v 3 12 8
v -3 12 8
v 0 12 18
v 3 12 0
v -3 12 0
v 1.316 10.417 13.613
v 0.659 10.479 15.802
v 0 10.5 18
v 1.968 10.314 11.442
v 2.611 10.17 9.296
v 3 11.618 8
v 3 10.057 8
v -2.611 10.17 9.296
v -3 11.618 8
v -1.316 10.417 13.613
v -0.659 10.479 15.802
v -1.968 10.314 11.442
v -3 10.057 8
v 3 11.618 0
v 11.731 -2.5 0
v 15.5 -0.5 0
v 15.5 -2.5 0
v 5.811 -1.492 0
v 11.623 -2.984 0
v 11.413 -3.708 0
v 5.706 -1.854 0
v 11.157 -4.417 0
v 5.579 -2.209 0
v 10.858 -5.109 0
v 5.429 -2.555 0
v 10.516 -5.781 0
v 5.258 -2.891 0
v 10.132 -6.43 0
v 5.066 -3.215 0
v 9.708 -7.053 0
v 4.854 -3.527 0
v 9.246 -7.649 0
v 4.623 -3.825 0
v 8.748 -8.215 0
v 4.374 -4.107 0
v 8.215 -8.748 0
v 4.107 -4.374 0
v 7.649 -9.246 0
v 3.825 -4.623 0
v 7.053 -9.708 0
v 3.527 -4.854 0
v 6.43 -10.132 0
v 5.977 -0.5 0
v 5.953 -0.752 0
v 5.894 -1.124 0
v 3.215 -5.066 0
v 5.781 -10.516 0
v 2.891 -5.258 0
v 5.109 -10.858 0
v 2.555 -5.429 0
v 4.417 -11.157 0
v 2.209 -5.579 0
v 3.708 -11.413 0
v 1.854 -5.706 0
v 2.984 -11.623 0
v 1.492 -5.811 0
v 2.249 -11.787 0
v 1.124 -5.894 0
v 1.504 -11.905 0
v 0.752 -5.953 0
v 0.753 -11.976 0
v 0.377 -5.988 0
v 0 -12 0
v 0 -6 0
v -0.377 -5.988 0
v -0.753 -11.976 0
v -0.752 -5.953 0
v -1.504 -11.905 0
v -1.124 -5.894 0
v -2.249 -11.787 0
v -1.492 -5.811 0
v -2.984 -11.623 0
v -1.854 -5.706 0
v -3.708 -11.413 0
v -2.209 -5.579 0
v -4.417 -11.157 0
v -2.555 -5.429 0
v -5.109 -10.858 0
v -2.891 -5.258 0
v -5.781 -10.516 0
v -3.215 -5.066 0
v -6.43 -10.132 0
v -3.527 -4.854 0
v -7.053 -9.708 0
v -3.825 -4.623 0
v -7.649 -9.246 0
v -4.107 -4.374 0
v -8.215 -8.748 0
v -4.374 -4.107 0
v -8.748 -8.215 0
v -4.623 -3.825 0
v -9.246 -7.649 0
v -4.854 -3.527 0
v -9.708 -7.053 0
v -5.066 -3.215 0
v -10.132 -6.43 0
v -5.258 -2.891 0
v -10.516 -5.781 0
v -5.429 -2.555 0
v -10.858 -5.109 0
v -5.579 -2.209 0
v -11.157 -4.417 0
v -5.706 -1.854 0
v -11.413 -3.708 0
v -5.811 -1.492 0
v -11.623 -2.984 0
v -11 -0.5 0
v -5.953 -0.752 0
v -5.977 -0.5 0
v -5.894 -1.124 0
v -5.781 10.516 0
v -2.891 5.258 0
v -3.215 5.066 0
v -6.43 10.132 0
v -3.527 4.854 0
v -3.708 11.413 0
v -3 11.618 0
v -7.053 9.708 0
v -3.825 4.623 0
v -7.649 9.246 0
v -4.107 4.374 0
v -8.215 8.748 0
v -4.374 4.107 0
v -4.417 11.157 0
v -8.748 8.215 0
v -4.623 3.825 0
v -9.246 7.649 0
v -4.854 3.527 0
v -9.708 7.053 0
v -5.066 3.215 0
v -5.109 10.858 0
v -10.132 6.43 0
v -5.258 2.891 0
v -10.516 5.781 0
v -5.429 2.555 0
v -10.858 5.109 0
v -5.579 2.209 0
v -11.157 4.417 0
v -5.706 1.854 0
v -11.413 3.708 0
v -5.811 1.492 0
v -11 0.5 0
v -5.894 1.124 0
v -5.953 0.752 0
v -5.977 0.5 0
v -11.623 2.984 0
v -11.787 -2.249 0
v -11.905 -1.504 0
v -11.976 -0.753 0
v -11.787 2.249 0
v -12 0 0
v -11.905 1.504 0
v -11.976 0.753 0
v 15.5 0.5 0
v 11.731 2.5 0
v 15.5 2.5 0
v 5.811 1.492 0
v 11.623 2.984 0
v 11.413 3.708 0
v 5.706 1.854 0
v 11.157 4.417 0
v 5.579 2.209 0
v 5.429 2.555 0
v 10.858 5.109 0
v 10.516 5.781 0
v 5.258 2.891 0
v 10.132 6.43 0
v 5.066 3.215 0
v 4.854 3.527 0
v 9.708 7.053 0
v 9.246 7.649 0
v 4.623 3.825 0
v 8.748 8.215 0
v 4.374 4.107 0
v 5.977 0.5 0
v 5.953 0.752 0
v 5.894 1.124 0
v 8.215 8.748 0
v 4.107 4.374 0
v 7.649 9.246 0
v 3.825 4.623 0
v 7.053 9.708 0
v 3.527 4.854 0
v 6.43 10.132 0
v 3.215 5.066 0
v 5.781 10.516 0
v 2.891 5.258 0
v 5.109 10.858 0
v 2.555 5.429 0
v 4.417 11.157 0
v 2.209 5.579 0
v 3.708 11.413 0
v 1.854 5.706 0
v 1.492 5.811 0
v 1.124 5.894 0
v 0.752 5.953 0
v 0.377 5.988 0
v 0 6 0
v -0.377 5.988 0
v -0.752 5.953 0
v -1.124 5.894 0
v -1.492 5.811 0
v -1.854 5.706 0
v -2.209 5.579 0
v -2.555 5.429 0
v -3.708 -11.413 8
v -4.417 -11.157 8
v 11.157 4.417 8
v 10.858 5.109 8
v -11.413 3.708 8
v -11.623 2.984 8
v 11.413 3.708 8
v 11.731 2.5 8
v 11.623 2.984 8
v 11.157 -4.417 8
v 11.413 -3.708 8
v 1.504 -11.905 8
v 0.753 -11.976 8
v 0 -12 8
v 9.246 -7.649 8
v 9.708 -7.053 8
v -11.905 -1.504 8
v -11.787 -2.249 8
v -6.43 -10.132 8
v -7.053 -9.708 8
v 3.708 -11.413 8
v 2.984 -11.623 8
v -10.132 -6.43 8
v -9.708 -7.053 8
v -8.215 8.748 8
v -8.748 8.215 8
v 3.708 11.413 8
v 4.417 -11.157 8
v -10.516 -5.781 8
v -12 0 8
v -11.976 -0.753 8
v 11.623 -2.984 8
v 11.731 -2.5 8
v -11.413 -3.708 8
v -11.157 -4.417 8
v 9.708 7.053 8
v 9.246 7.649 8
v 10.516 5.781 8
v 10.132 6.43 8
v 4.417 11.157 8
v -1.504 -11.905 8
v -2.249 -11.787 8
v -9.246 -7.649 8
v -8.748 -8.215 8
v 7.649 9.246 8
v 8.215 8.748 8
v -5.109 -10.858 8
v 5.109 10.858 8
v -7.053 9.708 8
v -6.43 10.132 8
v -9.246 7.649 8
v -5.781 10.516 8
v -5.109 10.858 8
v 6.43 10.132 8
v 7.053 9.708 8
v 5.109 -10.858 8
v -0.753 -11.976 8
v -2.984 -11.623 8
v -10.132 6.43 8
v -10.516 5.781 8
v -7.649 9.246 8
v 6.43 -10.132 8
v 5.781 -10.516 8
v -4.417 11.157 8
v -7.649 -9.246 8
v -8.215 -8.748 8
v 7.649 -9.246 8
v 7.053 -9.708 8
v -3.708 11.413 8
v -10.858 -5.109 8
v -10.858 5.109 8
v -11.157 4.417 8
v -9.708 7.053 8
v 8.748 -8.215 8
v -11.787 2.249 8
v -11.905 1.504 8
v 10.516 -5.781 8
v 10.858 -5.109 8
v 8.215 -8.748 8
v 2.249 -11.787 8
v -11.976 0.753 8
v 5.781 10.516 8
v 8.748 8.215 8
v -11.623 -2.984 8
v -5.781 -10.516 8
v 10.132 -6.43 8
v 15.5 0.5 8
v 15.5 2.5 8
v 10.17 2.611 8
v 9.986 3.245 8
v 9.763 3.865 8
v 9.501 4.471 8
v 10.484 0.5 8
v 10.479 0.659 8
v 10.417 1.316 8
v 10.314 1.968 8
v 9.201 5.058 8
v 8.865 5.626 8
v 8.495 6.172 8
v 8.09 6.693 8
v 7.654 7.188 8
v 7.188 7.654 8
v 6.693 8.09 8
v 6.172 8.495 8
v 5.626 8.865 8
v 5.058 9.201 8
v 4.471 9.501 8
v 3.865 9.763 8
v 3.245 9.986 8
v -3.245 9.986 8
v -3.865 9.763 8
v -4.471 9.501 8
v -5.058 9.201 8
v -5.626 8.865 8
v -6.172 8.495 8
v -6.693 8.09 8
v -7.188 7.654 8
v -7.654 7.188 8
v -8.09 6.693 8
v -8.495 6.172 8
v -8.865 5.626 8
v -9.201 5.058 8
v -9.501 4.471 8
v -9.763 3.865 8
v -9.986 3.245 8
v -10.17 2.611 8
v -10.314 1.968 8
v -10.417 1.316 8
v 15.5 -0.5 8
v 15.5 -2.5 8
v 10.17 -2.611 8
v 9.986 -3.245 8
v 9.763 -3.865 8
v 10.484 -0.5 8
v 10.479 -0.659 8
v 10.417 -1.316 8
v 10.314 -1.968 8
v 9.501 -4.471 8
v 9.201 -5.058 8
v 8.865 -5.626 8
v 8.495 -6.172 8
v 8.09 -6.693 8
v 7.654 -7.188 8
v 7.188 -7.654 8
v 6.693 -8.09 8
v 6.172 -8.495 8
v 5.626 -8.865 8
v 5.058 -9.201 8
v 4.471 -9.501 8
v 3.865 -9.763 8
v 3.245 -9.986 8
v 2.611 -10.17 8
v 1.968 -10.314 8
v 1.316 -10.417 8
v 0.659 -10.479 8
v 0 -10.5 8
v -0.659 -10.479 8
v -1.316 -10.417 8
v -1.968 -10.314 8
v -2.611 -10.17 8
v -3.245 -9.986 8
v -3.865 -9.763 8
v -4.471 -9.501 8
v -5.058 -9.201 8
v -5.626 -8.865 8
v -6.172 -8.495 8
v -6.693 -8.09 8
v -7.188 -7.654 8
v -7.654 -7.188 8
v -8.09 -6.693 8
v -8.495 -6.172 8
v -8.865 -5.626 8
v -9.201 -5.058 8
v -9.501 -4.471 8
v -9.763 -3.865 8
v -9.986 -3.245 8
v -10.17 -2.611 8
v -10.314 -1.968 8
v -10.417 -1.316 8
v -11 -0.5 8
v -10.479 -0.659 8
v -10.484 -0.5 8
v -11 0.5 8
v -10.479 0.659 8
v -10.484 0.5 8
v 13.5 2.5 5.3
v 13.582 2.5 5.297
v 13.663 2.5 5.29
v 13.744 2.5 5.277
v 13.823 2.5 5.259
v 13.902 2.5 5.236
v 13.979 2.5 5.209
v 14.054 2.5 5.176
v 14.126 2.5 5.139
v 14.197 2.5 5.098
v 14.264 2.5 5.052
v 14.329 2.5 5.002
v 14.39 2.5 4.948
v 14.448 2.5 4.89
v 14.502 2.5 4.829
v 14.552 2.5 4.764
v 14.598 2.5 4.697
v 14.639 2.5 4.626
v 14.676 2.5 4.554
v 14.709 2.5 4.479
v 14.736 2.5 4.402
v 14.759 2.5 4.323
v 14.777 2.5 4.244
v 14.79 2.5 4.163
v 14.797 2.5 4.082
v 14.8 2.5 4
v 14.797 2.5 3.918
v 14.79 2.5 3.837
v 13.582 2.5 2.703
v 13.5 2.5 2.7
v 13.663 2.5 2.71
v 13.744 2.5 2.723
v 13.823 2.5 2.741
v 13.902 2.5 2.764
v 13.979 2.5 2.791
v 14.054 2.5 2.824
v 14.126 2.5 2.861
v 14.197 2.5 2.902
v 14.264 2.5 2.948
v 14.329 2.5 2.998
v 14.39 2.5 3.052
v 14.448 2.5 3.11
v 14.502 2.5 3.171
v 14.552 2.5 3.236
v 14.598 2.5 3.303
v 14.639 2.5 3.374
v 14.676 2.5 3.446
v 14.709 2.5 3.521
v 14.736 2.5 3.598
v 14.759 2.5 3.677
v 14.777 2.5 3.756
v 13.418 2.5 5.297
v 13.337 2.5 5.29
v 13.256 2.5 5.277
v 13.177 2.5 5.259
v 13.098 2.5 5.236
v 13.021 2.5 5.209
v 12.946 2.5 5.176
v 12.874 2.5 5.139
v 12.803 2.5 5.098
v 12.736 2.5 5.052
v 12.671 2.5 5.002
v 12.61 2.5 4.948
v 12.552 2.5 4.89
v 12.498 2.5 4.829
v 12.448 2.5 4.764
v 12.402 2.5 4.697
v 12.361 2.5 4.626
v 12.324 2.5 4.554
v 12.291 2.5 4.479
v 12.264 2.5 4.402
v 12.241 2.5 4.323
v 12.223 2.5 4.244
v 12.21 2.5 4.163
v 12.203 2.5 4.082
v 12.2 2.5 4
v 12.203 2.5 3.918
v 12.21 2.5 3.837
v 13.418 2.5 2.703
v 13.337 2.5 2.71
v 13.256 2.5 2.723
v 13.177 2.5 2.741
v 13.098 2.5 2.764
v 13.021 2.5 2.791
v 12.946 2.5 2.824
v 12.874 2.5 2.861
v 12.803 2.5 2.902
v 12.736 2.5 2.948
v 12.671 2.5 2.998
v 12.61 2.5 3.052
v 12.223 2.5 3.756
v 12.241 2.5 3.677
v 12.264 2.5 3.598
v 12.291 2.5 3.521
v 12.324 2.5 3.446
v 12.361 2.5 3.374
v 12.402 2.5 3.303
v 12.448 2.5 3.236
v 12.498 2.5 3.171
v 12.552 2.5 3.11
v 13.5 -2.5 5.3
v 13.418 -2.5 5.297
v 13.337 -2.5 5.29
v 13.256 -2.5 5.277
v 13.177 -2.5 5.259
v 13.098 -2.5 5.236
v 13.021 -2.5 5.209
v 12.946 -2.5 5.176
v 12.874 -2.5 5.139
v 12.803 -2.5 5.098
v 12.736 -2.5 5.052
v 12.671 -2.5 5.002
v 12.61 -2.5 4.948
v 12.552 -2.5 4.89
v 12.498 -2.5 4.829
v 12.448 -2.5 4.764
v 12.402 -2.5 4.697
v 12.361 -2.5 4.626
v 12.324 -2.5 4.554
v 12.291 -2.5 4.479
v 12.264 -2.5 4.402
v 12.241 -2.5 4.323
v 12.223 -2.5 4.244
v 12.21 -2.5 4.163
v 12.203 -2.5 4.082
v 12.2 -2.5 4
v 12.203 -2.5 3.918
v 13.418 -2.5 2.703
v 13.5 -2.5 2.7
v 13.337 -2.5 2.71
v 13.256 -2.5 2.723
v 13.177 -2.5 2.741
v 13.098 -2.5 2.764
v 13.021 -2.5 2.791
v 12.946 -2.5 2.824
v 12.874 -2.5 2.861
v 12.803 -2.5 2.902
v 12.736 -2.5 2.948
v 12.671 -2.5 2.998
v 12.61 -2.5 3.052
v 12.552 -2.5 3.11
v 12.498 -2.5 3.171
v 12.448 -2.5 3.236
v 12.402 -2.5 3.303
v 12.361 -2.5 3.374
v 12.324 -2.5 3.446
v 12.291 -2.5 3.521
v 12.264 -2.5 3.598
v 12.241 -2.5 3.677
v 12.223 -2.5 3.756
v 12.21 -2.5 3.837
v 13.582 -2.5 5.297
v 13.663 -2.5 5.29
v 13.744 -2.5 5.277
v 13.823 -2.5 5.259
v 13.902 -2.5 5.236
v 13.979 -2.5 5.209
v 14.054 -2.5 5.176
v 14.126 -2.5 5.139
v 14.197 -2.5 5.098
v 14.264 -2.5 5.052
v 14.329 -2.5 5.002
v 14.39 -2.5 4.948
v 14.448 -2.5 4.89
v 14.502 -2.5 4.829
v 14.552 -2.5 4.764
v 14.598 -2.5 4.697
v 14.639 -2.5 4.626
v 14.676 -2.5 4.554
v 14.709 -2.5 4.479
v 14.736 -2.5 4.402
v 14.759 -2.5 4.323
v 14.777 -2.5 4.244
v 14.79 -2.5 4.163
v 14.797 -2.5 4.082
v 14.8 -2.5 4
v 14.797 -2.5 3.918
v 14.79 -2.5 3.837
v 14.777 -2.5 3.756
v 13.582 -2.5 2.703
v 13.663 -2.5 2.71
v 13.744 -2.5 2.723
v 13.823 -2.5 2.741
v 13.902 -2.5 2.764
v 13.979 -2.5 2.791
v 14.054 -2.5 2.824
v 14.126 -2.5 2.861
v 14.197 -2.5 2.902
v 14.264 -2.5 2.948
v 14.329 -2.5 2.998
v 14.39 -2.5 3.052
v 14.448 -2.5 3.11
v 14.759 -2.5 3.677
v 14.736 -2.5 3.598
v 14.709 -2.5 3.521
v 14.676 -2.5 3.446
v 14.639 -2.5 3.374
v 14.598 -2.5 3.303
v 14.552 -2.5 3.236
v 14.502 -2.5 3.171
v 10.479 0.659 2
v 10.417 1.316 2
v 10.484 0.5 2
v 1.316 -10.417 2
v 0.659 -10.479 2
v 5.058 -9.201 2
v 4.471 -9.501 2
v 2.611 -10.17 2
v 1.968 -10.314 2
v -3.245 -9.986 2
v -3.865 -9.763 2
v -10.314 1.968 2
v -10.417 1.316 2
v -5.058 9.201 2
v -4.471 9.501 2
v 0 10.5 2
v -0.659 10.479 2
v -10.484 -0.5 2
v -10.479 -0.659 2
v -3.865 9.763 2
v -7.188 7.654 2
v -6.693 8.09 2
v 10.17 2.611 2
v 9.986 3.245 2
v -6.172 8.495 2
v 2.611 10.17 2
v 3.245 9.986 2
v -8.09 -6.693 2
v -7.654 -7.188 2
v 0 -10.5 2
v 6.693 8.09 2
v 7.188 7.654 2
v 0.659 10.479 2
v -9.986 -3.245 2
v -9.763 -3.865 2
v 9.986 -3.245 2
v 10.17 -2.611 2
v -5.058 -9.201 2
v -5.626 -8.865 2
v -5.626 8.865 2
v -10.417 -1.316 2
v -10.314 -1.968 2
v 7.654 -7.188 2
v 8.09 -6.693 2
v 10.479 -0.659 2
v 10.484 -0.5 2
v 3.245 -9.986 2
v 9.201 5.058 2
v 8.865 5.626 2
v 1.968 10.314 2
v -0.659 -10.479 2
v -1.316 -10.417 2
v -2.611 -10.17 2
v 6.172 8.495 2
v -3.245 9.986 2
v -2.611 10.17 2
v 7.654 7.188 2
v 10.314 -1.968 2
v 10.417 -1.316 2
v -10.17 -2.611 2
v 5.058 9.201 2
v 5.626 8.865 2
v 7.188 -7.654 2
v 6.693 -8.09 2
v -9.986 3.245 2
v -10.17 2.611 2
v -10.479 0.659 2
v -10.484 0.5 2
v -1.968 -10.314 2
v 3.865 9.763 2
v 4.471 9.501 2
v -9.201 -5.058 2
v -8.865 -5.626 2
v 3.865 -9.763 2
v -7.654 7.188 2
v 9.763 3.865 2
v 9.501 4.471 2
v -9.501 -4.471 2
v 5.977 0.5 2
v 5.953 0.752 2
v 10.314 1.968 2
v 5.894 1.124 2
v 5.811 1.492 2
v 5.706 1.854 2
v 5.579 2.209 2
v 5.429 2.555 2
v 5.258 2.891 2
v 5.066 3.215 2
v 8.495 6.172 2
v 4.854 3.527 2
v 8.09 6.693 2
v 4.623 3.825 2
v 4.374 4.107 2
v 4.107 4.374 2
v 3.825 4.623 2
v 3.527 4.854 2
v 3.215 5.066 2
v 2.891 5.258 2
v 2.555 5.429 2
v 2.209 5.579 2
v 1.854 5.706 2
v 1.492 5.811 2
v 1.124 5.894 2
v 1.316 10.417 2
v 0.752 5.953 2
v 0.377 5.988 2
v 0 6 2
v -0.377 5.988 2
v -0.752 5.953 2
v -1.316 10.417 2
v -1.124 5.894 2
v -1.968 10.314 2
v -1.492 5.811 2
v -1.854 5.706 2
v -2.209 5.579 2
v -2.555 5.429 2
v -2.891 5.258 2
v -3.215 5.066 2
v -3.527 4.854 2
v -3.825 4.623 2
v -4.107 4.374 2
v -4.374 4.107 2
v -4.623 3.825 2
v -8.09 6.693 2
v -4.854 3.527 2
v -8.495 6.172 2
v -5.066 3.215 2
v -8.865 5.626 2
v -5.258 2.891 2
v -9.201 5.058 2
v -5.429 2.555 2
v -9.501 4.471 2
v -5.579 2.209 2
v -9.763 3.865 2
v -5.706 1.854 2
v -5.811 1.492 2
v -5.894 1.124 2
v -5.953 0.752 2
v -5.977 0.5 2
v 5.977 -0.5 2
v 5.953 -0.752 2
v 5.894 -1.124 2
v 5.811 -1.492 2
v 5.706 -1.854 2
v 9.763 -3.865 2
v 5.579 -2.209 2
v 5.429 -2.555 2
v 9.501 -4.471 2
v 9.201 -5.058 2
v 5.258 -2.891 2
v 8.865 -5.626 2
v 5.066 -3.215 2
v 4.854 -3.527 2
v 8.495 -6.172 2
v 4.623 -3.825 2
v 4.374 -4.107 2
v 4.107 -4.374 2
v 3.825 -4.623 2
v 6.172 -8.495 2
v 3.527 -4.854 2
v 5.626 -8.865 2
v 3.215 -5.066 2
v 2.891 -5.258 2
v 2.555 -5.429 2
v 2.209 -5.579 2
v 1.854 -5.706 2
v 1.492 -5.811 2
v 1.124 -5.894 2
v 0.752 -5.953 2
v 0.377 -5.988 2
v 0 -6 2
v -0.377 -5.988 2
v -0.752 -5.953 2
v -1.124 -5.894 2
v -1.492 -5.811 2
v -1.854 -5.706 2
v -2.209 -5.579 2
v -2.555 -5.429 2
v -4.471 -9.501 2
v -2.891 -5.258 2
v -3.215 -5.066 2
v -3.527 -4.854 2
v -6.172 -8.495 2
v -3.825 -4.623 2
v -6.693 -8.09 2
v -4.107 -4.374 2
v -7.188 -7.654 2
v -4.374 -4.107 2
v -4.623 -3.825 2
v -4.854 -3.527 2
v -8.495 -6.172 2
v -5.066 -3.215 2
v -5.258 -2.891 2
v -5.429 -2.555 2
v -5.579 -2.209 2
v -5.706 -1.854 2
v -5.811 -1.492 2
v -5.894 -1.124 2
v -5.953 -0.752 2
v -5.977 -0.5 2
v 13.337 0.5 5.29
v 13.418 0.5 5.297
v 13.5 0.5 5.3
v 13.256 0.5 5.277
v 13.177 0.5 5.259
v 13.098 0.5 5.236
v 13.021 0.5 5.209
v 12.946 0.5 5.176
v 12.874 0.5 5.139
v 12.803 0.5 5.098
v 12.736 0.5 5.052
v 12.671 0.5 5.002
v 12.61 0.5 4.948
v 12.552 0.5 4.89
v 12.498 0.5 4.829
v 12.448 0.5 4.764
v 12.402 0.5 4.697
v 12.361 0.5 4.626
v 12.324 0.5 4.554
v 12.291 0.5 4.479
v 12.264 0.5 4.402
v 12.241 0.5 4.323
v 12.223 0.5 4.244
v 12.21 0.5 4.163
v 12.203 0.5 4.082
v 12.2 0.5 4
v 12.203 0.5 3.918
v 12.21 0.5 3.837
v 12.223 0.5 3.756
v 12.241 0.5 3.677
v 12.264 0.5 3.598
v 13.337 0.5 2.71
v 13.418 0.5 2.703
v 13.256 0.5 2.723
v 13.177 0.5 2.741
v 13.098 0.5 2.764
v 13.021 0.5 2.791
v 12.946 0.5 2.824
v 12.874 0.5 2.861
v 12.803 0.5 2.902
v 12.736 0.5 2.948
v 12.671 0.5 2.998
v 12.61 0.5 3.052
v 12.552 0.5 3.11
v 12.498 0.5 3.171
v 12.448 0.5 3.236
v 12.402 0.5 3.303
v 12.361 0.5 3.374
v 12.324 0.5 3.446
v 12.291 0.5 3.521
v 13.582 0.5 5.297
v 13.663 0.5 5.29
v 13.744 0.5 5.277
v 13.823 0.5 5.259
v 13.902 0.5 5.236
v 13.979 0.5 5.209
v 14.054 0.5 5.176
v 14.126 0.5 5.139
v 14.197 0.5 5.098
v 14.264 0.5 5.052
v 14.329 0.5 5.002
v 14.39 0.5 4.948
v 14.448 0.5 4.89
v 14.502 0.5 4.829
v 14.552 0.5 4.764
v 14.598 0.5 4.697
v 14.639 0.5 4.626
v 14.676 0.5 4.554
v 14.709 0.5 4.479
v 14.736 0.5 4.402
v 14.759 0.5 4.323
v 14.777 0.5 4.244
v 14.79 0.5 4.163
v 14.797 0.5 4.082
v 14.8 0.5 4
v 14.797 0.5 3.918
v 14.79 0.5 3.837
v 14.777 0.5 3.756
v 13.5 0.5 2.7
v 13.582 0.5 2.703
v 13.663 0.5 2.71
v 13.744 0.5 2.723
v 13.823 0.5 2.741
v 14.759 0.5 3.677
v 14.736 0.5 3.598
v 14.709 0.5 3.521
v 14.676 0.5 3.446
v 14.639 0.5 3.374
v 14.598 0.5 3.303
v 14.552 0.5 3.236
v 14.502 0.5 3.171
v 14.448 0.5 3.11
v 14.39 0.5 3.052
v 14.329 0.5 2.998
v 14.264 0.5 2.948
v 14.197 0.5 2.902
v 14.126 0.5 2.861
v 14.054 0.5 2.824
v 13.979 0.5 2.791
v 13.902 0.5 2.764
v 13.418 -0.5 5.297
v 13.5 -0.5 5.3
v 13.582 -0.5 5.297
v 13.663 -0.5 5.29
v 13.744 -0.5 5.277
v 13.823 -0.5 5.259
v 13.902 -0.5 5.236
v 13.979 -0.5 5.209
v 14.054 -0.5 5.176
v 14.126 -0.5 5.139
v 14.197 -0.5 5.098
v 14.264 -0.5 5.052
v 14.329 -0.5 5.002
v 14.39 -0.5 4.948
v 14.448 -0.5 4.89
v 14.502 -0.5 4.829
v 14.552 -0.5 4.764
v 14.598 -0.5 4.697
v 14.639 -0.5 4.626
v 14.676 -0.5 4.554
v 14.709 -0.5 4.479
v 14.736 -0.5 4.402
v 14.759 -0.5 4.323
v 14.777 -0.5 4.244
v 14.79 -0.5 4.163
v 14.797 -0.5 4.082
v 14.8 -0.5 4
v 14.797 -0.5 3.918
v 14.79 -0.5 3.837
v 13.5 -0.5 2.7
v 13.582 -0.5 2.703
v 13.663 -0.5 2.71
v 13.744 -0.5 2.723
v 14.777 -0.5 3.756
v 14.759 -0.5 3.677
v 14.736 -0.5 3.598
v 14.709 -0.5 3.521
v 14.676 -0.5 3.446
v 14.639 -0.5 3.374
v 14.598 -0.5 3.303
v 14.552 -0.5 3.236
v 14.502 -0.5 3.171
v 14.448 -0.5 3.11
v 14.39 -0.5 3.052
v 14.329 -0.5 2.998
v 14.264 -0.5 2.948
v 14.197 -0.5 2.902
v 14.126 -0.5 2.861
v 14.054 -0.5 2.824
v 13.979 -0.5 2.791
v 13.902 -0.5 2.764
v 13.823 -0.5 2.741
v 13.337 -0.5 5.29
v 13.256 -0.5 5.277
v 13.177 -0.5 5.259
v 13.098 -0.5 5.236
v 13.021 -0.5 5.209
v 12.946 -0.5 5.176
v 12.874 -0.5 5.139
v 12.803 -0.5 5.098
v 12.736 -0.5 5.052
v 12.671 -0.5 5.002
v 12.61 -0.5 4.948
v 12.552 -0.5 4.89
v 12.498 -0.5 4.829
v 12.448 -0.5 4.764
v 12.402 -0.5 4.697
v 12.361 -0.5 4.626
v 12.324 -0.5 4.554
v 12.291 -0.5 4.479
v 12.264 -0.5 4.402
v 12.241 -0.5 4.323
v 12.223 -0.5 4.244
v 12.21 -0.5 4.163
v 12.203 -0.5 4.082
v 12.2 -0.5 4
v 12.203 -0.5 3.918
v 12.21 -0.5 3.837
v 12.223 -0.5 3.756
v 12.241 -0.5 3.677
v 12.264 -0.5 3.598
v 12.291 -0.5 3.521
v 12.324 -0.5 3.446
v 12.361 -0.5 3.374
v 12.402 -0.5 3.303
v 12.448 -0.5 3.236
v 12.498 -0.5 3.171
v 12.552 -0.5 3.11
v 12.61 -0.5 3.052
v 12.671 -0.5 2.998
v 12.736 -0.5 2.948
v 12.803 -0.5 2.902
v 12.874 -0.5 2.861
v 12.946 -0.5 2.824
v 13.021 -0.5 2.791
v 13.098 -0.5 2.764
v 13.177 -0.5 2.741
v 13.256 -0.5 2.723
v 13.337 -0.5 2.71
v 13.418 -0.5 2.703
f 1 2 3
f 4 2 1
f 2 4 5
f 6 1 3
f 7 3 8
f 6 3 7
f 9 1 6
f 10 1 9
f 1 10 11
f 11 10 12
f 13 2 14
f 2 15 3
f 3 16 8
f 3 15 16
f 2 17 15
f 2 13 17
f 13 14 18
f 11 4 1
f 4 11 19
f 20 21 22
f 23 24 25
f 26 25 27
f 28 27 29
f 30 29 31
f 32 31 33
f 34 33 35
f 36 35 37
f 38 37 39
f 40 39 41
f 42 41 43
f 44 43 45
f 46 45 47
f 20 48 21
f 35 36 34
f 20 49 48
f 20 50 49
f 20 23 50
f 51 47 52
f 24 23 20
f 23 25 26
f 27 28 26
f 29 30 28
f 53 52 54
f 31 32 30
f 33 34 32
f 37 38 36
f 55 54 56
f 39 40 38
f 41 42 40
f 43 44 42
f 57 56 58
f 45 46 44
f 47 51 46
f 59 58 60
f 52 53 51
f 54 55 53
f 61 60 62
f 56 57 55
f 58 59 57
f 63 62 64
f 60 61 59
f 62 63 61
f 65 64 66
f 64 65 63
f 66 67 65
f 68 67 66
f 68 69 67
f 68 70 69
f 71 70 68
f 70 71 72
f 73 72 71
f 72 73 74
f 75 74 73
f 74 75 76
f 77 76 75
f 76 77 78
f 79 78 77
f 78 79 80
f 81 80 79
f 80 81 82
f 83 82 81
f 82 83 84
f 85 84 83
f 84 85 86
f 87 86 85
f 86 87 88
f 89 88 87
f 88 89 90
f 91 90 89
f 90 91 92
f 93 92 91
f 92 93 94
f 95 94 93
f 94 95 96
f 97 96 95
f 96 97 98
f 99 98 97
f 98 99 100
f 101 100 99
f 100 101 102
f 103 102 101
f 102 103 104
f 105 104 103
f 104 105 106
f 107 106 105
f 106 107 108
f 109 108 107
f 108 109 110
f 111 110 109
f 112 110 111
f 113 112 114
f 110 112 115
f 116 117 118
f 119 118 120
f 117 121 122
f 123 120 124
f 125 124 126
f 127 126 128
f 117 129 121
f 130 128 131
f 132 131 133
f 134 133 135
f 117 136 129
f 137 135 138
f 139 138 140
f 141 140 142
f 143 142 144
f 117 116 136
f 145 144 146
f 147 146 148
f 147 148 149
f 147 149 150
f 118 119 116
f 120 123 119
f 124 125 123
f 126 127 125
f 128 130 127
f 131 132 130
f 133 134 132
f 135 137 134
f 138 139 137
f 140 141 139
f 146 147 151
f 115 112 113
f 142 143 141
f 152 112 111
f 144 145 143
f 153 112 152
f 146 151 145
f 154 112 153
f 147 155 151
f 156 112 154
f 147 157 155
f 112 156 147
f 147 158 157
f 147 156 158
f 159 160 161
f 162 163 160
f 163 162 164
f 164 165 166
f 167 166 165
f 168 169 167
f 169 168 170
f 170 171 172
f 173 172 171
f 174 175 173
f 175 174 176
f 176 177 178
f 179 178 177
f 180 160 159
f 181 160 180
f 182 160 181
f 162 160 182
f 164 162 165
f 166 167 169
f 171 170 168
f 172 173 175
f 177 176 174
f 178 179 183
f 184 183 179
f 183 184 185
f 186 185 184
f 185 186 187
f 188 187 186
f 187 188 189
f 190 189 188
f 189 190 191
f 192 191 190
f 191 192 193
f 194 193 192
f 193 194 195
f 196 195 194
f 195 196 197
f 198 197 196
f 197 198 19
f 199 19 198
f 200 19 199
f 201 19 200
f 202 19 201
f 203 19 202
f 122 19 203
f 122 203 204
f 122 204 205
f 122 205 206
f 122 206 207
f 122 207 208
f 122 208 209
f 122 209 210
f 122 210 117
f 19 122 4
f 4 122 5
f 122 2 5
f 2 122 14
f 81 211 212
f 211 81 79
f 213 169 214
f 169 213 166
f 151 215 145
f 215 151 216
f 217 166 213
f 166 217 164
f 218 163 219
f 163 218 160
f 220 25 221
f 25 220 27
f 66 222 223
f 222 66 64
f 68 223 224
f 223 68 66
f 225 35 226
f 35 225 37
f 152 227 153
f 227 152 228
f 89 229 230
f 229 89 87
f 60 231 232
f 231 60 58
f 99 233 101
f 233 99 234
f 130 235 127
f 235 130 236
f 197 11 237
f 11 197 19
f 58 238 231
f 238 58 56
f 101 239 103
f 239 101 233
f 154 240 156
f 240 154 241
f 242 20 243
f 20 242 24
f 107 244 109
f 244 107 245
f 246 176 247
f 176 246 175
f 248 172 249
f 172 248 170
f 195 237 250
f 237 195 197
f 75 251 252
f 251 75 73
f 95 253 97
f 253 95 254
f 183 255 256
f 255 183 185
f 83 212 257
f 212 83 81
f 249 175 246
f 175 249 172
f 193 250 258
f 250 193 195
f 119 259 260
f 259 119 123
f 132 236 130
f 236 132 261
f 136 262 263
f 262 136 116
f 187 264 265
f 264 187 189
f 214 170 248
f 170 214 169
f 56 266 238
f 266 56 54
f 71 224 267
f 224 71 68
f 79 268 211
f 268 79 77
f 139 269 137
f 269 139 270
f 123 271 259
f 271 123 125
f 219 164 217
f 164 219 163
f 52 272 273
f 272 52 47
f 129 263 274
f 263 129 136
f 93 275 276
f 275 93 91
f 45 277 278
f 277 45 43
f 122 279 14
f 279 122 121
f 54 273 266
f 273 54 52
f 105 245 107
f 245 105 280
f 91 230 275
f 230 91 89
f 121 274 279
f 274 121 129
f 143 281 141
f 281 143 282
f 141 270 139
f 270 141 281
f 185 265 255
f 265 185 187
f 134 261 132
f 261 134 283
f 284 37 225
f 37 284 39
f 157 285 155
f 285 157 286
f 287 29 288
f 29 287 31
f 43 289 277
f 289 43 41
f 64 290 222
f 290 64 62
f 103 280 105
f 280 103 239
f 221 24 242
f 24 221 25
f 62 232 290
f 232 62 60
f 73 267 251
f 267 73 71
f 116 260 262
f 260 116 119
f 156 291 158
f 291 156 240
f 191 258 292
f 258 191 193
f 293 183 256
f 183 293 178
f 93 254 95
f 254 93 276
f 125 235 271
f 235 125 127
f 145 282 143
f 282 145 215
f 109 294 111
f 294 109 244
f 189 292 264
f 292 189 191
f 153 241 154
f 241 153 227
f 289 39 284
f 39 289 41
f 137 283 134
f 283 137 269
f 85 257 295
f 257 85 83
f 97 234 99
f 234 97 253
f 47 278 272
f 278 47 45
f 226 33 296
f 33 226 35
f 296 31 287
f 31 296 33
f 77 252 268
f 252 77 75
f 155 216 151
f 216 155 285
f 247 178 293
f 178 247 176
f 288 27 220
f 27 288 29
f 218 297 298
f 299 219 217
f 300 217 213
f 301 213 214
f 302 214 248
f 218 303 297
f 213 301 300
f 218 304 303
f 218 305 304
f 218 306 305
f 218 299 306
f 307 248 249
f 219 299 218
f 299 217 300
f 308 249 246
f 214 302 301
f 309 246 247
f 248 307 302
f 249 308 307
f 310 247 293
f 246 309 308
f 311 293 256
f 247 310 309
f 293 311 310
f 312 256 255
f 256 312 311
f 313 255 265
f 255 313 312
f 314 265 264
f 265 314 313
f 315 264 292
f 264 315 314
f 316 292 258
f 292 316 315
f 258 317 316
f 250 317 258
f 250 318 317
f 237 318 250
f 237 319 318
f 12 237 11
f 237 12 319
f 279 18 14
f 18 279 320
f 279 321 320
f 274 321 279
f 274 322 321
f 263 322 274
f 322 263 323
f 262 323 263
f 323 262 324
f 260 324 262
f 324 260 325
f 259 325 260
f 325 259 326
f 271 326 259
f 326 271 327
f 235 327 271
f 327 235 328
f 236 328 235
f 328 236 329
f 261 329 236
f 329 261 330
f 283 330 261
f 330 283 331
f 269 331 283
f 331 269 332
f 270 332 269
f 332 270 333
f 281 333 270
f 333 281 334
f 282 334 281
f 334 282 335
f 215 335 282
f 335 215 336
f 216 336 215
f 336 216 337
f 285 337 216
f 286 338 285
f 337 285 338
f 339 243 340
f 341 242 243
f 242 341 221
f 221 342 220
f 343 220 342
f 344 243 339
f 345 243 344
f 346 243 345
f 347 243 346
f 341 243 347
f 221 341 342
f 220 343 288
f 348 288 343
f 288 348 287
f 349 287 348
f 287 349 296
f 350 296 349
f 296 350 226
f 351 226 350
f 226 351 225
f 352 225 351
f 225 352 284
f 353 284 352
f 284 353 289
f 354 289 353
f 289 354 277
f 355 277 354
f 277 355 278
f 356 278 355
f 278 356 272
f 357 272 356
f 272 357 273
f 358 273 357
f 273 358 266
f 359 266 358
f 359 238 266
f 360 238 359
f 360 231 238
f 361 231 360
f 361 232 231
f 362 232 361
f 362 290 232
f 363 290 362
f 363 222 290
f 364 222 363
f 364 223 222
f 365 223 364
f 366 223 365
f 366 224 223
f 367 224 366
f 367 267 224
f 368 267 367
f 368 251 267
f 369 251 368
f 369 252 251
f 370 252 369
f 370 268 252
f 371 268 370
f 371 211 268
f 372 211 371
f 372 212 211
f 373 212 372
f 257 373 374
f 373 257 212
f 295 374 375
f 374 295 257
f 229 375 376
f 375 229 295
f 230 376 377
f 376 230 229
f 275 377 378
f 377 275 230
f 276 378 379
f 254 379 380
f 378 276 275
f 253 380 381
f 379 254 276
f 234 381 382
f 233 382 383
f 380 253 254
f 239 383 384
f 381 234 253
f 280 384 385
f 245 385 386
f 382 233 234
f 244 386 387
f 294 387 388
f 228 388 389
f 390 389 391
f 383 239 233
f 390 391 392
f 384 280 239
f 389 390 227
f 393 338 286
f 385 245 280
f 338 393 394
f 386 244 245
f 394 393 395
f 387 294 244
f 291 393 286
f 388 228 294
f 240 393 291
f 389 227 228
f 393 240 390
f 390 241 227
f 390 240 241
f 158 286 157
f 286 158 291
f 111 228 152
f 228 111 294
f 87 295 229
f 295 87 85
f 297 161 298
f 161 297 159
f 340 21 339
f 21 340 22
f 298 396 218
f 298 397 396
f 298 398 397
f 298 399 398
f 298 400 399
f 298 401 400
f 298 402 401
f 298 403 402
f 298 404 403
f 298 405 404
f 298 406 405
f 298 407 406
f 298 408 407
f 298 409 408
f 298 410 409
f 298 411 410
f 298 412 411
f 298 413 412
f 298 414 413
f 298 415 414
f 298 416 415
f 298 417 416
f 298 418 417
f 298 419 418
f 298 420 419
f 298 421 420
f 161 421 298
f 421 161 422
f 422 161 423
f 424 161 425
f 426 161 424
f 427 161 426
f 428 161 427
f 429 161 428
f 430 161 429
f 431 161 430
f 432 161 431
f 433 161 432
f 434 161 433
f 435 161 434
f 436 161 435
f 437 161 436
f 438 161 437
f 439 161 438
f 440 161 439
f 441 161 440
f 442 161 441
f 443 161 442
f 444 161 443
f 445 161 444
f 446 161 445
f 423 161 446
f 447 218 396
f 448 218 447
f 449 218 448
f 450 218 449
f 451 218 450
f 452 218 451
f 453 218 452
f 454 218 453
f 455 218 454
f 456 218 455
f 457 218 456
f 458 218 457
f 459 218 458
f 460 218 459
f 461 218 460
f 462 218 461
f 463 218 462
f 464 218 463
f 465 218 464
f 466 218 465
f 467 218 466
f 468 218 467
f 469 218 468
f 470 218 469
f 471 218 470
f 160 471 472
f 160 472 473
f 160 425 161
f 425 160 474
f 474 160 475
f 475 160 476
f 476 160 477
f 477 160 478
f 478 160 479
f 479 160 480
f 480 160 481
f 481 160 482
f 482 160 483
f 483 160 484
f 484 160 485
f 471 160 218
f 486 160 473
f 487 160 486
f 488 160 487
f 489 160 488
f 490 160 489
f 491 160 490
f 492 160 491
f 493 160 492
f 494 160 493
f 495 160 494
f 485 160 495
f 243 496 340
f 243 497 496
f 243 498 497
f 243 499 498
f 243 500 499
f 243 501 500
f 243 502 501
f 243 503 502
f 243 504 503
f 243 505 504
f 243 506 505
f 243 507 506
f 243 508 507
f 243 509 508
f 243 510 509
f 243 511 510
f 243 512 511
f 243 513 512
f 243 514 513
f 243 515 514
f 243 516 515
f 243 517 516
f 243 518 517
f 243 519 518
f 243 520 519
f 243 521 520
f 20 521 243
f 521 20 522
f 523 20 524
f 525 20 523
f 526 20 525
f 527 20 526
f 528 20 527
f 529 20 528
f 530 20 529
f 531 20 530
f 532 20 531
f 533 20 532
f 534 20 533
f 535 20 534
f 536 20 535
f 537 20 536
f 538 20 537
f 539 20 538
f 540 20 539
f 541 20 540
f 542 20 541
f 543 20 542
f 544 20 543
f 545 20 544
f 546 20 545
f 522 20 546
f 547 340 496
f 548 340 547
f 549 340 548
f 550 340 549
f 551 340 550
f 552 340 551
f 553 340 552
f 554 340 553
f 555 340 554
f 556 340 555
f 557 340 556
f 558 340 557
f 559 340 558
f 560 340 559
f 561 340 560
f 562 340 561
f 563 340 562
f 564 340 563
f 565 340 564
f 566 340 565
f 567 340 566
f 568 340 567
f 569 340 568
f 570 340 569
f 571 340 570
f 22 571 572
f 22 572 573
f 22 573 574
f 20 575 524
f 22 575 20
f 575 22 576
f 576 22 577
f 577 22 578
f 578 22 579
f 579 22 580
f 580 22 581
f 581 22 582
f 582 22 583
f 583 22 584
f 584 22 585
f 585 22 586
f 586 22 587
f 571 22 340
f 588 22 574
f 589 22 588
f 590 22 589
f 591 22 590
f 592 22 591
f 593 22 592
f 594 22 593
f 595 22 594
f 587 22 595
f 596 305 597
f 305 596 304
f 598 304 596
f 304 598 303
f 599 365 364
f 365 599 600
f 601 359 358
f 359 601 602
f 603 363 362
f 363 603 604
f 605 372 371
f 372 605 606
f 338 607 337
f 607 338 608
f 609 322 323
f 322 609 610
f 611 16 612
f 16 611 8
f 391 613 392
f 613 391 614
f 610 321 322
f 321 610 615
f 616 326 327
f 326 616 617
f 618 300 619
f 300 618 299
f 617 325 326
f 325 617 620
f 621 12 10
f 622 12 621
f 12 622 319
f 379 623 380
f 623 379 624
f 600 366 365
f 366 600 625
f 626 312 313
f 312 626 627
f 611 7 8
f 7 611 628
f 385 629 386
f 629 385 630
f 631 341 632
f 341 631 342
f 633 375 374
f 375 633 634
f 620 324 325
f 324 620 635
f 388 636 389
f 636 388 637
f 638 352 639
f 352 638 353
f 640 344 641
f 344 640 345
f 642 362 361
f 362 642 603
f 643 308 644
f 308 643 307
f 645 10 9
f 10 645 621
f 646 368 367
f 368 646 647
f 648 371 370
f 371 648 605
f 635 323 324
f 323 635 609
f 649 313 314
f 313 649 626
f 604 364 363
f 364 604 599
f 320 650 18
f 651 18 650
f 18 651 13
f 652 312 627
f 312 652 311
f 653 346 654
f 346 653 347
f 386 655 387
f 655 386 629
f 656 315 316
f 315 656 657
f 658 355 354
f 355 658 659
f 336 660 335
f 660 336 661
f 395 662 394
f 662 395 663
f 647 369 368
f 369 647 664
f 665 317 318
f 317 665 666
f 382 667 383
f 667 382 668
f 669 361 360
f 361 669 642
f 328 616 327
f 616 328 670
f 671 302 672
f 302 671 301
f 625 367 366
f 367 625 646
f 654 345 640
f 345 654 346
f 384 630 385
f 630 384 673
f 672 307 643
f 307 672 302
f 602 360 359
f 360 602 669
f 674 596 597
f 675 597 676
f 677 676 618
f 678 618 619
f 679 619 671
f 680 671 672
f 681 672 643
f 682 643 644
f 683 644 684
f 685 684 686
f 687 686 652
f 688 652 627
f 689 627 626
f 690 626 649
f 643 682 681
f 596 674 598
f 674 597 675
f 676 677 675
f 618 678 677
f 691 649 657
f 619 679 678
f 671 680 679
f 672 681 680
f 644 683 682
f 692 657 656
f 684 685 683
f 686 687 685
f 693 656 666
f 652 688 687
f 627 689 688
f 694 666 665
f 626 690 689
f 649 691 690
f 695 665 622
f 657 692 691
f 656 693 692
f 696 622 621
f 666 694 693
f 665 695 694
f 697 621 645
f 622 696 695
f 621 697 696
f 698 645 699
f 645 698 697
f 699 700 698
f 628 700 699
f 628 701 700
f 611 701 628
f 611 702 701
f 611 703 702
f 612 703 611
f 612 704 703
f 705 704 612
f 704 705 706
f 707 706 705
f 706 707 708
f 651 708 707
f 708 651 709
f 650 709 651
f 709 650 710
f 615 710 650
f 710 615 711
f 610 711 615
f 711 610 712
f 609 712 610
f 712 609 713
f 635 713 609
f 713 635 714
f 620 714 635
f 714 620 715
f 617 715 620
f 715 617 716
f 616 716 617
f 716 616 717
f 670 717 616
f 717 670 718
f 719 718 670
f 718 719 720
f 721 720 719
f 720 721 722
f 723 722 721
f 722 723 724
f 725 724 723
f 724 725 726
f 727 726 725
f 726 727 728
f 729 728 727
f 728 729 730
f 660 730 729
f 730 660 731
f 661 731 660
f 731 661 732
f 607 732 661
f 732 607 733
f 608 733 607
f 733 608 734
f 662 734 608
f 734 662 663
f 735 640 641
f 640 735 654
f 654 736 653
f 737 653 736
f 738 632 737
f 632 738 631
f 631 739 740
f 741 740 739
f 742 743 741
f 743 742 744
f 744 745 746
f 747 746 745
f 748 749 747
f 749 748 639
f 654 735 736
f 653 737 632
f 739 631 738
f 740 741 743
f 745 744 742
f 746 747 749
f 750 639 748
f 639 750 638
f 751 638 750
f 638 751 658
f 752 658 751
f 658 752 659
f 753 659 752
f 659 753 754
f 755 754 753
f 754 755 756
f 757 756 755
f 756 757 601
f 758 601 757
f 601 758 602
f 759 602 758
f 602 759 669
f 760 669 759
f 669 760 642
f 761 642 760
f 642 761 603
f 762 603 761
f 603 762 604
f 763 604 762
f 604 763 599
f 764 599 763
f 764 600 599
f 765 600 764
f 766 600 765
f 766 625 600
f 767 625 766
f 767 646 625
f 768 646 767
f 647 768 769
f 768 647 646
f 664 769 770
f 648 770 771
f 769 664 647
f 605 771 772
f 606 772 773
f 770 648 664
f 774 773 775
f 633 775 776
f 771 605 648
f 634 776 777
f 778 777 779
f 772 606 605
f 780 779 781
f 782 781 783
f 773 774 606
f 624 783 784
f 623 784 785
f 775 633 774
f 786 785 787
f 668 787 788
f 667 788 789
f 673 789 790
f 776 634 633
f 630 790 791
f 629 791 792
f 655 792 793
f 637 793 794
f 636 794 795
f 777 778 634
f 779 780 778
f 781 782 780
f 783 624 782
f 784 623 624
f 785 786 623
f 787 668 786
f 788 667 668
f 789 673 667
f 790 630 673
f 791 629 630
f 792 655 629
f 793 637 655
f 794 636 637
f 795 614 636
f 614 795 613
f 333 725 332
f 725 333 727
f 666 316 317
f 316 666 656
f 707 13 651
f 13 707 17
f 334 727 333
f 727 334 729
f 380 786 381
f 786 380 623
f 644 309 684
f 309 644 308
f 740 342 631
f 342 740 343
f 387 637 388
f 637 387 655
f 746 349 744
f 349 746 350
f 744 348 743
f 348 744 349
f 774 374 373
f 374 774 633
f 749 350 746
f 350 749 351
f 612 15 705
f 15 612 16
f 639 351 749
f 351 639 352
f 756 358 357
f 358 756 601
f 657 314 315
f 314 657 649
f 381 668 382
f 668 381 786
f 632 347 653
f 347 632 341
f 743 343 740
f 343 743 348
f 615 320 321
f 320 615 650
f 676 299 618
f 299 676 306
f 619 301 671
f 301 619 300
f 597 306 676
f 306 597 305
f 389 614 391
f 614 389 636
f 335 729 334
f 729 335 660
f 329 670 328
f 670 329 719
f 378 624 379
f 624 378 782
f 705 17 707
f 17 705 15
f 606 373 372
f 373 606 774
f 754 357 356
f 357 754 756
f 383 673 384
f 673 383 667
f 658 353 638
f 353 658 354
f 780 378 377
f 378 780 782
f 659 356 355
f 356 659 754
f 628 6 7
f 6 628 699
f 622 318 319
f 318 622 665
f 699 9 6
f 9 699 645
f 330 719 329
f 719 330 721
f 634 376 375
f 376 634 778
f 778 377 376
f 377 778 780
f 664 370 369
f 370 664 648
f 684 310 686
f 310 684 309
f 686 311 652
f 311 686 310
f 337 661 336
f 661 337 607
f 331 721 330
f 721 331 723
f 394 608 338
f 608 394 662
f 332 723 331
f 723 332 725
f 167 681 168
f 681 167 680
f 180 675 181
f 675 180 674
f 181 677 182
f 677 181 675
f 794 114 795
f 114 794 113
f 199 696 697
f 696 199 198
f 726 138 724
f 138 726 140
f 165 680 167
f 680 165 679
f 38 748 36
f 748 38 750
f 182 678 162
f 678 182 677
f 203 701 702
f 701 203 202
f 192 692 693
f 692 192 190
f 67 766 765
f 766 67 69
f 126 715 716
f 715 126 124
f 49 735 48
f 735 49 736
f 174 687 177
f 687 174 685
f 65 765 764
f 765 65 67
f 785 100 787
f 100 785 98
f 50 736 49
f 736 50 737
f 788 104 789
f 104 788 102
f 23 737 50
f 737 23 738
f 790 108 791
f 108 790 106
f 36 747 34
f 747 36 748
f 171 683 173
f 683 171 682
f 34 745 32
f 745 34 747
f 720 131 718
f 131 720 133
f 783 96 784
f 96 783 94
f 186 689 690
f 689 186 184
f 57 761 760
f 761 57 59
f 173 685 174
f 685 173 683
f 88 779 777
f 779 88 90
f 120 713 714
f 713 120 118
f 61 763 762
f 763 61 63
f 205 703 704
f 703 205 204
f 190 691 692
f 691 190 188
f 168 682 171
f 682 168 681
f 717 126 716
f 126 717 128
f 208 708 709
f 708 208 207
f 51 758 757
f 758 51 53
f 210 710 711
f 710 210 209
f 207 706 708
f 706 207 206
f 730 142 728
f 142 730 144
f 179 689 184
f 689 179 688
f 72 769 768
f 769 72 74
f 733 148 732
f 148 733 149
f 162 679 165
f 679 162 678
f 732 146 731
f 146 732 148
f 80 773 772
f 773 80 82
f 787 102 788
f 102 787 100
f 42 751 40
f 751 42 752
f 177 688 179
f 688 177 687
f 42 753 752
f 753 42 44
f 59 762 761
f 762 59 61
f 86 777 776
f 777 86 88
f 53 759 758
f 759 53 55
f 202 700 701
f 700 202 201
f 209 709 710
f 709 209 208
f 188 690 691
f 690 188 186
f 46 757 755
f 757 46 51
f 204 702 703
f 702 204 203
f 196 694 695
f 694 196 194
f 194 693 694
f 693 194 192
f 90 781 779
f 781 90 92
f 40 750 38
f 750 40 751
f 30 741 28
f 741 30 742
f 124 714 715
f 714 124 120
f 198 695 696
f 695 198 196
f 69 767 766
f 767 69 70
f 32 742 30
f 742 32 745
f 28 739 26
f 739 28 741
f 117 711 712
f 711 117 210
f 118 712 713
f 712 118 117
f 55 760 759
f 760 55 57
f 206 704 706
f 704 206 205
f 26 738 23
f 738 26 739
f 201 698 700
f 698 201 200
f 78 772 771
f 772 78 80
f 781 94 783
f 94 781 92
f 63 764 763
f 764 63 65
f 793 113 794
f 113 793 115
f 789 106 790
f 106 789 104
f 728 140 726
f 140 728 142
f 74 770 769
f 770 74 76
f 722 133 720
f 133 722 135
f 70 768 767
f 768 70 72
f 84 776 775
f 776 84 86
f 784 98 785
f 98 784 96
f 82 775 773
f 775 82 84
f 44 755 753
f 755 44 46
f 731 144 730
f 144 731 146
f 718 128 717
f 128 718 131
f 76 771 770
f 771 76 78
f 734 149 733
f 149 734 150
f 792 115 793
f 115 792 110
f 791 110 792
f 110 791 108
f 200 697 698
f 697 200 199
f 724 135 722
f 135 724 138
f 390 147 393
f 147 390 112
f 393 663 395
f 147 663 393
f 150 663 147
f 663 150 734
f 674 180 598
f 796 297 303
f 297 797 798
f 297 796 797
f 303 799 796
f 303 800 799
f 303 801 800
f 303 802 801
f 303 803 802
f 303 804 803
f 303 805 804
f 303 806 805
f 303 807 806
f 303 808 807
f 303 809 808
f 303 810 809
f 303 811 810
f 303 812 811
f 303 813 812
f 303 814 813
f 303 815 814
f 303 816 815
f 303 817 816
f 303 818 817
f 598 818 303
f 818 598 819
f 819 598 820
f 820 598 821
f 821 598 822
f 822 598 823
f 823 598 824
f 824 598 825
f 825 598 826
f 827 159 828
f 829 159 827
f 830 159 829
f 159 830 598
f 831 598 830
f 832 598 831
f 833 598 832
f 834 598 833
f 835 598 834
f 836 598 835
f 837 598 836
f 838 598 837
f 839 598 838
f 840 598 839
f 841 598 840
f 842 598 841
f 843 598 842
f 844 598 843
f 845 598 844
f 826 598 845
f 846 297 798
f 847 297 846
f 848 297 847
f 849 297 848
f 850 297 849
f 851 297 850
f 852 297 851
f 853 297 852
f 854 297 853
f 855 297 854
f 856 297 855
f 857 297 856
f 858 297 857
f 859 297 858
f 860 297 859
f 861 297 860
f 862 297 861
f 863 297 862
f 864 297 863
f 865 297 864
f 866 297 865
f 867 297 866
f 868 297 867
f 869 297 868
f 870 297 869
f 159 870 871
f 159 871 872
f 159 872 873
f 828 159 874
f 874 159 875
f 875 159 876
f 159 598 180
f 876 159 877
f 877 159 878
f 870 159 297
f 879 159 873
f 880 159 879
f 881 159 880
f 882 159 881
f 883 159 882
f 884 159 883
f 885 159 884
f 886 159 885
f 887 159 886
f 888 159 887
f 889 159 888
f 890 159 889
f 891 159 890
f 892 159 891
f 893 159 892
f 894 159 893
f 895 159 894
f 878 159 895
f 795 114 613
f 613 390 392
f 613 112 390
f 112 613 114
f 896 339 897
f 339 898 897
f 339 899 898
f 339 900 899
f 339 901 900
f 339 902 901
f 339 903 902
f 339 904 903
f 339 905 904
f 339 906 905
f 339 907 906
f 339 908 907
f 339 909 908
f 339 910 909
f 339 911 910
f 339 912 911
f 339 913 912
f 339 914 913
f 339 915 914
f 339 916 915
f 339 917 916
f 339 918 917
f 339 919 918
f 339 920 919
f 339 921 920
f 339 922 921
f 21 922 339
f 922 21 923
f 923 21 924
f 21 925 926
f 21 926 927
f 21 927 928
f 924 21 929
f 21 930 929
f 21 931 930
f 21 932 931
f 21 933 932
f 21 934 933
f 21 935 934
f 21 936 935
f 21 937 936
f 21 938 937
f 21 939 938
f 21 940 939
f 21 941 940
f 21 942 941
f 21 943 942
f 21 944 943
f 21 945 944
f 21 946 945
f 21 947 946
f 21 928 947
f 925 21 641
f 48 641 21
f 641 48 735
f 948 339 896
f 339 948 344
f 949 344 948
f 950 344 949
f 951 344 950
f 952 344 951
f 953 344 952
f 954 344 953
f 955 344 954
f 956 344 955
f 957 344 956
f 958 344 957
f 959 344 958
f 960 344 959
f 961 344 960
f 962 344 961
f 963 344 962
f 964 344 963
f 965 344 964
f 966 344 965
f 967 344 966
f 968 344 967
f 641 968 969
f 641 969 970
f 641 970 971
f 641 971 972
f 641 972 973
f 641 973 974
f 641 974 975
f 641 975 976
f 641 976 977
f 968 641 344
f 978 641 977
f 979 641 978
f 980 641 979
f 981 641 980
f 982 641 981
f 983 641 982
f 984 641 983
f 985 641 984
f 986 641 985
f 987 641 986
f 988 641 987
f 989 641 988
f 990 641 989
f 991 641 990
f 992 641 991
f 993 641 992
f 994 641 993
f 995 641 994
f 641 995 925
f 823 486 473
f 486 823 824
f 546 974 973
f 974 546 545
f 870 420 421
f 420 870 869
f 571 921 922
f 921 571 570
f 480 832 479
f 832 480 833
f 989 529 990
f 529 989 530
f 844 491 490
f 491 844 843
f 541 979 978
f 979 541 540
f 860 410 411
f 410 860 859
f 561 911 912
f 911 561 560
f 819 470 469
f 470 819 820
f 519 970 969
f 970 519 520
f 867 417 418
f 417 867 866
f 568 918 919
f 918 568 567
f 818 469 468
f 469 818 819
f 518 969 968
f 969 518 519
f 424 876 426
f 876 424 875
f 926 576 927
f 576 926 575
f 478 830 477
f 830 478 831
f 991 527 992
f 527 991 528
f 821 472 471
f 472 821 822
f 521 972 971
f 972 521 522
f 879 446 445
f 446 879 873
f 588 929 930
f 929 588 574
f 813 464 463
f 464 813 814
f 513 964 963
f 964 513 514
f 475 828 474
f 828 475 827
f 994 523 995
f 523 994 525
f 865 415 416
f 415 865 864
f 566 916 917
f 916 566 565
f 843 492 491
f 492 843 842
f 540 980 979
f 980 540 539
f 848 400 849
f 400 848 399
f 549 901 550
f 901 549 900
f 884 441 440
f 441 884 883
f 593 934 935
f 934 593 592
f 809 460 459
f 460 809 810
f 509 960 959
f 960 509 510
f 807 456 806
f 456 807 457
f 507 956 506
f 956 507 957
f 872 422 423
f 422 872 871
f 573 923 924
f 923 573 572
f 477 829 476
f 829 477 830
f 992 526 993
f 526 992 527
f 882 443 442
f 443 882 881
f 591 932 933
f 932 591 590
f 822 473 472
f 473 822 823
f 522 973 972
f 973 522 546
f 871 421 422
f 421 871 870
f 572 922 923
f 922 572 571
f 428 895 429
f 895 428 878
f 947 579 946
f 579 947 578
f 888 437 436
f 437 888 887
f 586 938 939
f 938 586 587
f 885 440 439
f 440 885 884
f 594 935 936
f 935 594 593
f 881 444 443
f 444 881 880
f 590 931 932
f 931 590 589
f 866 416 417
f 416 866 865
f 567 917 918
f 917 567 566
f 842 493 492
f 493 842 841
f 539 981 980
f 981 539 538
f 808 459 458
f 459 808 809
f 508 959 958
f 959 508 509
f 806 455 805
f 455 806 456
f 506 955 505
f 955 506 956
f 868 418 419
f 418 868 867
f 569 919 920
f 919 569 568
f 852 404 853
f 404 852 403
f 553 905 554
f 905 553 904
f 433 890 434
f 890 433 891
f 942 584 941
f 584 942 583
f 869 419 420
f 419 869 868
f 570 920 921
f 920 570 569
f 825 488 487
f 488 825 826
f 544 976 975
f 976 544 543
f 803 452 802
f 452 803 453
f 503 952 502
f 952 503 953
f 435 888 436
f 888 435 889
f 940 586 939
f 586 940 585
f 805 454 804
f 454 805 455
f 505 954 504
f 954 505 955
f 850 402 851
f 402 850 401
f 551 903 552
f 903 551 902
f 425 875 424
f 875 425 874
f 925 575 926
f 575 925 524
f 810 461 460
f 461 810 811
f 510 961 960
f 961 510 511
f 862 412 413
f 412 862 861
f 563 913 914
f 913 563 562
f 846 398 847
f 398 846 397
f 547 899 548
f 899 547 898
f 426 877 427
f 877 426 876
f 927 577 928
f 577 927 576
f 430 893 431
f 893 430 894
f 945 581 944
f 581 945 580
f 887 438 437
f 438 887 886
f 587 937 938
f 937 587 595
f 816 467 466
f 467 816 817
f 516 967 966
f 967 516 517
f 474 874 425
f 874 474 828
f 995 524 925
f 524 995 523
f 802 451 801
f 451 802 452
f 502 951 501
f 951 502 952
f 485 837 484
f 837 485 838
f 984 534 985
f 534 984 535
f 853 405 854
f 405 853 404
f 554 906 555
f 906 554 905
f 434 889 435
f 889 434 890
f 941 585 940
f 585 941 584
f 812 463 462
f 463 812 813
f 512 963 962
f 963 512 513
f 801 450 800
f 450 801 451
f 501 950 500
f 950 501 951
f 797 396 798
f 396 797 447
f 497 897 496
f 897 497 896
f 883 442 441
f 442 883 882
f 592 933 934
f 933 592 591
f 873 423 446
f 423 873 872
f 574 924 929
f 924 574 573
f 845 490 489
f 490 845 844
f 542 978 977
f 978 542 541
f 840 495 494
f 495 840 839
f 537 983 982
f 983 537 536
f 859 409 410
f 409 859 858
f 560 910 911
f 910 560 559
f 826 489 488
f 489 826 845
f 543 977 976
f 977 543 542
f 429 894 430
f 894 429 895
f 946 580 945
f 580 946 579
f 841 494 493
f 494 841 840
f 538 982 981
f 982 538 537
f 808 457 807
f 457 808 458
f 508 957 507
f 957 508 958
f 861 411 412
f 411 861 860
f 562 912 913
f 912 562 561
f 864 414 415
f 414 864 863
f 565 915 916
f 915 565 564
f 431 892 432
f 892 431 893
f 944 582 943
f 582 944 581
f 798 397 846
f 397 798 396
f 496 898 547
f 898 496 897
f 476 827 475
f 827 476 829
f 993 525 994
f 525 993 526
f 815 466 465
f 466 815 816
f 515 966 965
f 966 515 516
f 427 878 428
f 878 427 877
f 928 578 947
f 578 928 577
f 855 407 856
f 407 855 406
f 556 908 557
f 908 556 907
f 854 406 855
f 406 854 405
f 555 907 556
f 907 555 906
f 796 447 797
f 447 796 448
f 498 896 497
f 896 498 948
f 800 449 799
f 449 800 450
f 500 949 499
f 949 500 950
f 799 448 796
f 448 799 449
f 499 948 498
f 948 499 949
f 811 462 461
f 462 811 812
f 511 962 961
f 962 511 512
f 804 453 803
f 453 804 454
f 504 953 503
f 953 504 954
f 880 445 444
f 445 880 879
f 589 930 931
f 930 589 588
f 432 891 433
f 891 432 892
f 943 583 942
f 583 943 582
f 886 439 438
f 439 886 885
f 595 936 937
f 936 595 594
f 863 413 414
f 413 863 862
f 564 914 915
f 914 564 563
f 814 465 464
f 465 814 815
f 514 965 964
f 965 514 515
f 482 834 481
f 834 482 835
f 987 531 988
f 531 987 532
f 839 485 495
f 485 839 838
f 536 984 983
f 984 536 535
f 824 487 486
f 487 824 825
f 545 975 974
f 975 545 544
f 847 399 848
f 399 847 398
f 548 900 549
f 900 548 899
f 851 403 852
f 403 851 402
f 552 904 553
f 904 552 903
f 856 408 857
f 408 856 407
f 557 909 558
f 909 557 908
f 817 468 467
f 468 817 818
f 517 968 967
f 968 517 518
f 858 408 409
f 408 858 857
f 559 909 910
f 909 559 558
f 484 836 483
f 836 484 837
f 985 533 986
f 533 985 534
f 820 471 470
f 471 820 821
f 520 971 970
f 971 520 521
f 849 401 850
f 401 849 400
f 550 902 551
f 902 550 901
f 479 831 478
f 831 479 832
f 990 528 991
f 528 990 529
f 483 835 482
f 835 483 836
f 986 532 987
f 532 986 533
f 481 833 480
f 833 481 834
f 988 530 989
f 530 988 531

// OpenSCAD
$fn = 100;


difference() {

    union() {
        cylinder(d=24, h=8);

        translate([0, 12, 8]) {
            rotate([90, 0, 0])
                linear_extrude(height = 2)                
                    polygon([[-3, 0], [3, 0], [0, 10]]);

            translate([-3, -2, -8]) 
                cube([6, 2, 8]);
        }

        translate([-11.5, -2.5, 0]) 
            cube([27, 5, 8]);
    }

    translate([0, 0, 2]) 
        cylinder(d=21, h=20);

    translate([0, 0, -1]) 
        cylinder(d=12, h=10);

    translate([-11, -0.5, -1]) 
        cube([40, 1, 10]);

    translate([13.5, 5, 4]) 
        rotate([90, 0, 0]) 
            cylinder(d=2.6, h=10);
}
